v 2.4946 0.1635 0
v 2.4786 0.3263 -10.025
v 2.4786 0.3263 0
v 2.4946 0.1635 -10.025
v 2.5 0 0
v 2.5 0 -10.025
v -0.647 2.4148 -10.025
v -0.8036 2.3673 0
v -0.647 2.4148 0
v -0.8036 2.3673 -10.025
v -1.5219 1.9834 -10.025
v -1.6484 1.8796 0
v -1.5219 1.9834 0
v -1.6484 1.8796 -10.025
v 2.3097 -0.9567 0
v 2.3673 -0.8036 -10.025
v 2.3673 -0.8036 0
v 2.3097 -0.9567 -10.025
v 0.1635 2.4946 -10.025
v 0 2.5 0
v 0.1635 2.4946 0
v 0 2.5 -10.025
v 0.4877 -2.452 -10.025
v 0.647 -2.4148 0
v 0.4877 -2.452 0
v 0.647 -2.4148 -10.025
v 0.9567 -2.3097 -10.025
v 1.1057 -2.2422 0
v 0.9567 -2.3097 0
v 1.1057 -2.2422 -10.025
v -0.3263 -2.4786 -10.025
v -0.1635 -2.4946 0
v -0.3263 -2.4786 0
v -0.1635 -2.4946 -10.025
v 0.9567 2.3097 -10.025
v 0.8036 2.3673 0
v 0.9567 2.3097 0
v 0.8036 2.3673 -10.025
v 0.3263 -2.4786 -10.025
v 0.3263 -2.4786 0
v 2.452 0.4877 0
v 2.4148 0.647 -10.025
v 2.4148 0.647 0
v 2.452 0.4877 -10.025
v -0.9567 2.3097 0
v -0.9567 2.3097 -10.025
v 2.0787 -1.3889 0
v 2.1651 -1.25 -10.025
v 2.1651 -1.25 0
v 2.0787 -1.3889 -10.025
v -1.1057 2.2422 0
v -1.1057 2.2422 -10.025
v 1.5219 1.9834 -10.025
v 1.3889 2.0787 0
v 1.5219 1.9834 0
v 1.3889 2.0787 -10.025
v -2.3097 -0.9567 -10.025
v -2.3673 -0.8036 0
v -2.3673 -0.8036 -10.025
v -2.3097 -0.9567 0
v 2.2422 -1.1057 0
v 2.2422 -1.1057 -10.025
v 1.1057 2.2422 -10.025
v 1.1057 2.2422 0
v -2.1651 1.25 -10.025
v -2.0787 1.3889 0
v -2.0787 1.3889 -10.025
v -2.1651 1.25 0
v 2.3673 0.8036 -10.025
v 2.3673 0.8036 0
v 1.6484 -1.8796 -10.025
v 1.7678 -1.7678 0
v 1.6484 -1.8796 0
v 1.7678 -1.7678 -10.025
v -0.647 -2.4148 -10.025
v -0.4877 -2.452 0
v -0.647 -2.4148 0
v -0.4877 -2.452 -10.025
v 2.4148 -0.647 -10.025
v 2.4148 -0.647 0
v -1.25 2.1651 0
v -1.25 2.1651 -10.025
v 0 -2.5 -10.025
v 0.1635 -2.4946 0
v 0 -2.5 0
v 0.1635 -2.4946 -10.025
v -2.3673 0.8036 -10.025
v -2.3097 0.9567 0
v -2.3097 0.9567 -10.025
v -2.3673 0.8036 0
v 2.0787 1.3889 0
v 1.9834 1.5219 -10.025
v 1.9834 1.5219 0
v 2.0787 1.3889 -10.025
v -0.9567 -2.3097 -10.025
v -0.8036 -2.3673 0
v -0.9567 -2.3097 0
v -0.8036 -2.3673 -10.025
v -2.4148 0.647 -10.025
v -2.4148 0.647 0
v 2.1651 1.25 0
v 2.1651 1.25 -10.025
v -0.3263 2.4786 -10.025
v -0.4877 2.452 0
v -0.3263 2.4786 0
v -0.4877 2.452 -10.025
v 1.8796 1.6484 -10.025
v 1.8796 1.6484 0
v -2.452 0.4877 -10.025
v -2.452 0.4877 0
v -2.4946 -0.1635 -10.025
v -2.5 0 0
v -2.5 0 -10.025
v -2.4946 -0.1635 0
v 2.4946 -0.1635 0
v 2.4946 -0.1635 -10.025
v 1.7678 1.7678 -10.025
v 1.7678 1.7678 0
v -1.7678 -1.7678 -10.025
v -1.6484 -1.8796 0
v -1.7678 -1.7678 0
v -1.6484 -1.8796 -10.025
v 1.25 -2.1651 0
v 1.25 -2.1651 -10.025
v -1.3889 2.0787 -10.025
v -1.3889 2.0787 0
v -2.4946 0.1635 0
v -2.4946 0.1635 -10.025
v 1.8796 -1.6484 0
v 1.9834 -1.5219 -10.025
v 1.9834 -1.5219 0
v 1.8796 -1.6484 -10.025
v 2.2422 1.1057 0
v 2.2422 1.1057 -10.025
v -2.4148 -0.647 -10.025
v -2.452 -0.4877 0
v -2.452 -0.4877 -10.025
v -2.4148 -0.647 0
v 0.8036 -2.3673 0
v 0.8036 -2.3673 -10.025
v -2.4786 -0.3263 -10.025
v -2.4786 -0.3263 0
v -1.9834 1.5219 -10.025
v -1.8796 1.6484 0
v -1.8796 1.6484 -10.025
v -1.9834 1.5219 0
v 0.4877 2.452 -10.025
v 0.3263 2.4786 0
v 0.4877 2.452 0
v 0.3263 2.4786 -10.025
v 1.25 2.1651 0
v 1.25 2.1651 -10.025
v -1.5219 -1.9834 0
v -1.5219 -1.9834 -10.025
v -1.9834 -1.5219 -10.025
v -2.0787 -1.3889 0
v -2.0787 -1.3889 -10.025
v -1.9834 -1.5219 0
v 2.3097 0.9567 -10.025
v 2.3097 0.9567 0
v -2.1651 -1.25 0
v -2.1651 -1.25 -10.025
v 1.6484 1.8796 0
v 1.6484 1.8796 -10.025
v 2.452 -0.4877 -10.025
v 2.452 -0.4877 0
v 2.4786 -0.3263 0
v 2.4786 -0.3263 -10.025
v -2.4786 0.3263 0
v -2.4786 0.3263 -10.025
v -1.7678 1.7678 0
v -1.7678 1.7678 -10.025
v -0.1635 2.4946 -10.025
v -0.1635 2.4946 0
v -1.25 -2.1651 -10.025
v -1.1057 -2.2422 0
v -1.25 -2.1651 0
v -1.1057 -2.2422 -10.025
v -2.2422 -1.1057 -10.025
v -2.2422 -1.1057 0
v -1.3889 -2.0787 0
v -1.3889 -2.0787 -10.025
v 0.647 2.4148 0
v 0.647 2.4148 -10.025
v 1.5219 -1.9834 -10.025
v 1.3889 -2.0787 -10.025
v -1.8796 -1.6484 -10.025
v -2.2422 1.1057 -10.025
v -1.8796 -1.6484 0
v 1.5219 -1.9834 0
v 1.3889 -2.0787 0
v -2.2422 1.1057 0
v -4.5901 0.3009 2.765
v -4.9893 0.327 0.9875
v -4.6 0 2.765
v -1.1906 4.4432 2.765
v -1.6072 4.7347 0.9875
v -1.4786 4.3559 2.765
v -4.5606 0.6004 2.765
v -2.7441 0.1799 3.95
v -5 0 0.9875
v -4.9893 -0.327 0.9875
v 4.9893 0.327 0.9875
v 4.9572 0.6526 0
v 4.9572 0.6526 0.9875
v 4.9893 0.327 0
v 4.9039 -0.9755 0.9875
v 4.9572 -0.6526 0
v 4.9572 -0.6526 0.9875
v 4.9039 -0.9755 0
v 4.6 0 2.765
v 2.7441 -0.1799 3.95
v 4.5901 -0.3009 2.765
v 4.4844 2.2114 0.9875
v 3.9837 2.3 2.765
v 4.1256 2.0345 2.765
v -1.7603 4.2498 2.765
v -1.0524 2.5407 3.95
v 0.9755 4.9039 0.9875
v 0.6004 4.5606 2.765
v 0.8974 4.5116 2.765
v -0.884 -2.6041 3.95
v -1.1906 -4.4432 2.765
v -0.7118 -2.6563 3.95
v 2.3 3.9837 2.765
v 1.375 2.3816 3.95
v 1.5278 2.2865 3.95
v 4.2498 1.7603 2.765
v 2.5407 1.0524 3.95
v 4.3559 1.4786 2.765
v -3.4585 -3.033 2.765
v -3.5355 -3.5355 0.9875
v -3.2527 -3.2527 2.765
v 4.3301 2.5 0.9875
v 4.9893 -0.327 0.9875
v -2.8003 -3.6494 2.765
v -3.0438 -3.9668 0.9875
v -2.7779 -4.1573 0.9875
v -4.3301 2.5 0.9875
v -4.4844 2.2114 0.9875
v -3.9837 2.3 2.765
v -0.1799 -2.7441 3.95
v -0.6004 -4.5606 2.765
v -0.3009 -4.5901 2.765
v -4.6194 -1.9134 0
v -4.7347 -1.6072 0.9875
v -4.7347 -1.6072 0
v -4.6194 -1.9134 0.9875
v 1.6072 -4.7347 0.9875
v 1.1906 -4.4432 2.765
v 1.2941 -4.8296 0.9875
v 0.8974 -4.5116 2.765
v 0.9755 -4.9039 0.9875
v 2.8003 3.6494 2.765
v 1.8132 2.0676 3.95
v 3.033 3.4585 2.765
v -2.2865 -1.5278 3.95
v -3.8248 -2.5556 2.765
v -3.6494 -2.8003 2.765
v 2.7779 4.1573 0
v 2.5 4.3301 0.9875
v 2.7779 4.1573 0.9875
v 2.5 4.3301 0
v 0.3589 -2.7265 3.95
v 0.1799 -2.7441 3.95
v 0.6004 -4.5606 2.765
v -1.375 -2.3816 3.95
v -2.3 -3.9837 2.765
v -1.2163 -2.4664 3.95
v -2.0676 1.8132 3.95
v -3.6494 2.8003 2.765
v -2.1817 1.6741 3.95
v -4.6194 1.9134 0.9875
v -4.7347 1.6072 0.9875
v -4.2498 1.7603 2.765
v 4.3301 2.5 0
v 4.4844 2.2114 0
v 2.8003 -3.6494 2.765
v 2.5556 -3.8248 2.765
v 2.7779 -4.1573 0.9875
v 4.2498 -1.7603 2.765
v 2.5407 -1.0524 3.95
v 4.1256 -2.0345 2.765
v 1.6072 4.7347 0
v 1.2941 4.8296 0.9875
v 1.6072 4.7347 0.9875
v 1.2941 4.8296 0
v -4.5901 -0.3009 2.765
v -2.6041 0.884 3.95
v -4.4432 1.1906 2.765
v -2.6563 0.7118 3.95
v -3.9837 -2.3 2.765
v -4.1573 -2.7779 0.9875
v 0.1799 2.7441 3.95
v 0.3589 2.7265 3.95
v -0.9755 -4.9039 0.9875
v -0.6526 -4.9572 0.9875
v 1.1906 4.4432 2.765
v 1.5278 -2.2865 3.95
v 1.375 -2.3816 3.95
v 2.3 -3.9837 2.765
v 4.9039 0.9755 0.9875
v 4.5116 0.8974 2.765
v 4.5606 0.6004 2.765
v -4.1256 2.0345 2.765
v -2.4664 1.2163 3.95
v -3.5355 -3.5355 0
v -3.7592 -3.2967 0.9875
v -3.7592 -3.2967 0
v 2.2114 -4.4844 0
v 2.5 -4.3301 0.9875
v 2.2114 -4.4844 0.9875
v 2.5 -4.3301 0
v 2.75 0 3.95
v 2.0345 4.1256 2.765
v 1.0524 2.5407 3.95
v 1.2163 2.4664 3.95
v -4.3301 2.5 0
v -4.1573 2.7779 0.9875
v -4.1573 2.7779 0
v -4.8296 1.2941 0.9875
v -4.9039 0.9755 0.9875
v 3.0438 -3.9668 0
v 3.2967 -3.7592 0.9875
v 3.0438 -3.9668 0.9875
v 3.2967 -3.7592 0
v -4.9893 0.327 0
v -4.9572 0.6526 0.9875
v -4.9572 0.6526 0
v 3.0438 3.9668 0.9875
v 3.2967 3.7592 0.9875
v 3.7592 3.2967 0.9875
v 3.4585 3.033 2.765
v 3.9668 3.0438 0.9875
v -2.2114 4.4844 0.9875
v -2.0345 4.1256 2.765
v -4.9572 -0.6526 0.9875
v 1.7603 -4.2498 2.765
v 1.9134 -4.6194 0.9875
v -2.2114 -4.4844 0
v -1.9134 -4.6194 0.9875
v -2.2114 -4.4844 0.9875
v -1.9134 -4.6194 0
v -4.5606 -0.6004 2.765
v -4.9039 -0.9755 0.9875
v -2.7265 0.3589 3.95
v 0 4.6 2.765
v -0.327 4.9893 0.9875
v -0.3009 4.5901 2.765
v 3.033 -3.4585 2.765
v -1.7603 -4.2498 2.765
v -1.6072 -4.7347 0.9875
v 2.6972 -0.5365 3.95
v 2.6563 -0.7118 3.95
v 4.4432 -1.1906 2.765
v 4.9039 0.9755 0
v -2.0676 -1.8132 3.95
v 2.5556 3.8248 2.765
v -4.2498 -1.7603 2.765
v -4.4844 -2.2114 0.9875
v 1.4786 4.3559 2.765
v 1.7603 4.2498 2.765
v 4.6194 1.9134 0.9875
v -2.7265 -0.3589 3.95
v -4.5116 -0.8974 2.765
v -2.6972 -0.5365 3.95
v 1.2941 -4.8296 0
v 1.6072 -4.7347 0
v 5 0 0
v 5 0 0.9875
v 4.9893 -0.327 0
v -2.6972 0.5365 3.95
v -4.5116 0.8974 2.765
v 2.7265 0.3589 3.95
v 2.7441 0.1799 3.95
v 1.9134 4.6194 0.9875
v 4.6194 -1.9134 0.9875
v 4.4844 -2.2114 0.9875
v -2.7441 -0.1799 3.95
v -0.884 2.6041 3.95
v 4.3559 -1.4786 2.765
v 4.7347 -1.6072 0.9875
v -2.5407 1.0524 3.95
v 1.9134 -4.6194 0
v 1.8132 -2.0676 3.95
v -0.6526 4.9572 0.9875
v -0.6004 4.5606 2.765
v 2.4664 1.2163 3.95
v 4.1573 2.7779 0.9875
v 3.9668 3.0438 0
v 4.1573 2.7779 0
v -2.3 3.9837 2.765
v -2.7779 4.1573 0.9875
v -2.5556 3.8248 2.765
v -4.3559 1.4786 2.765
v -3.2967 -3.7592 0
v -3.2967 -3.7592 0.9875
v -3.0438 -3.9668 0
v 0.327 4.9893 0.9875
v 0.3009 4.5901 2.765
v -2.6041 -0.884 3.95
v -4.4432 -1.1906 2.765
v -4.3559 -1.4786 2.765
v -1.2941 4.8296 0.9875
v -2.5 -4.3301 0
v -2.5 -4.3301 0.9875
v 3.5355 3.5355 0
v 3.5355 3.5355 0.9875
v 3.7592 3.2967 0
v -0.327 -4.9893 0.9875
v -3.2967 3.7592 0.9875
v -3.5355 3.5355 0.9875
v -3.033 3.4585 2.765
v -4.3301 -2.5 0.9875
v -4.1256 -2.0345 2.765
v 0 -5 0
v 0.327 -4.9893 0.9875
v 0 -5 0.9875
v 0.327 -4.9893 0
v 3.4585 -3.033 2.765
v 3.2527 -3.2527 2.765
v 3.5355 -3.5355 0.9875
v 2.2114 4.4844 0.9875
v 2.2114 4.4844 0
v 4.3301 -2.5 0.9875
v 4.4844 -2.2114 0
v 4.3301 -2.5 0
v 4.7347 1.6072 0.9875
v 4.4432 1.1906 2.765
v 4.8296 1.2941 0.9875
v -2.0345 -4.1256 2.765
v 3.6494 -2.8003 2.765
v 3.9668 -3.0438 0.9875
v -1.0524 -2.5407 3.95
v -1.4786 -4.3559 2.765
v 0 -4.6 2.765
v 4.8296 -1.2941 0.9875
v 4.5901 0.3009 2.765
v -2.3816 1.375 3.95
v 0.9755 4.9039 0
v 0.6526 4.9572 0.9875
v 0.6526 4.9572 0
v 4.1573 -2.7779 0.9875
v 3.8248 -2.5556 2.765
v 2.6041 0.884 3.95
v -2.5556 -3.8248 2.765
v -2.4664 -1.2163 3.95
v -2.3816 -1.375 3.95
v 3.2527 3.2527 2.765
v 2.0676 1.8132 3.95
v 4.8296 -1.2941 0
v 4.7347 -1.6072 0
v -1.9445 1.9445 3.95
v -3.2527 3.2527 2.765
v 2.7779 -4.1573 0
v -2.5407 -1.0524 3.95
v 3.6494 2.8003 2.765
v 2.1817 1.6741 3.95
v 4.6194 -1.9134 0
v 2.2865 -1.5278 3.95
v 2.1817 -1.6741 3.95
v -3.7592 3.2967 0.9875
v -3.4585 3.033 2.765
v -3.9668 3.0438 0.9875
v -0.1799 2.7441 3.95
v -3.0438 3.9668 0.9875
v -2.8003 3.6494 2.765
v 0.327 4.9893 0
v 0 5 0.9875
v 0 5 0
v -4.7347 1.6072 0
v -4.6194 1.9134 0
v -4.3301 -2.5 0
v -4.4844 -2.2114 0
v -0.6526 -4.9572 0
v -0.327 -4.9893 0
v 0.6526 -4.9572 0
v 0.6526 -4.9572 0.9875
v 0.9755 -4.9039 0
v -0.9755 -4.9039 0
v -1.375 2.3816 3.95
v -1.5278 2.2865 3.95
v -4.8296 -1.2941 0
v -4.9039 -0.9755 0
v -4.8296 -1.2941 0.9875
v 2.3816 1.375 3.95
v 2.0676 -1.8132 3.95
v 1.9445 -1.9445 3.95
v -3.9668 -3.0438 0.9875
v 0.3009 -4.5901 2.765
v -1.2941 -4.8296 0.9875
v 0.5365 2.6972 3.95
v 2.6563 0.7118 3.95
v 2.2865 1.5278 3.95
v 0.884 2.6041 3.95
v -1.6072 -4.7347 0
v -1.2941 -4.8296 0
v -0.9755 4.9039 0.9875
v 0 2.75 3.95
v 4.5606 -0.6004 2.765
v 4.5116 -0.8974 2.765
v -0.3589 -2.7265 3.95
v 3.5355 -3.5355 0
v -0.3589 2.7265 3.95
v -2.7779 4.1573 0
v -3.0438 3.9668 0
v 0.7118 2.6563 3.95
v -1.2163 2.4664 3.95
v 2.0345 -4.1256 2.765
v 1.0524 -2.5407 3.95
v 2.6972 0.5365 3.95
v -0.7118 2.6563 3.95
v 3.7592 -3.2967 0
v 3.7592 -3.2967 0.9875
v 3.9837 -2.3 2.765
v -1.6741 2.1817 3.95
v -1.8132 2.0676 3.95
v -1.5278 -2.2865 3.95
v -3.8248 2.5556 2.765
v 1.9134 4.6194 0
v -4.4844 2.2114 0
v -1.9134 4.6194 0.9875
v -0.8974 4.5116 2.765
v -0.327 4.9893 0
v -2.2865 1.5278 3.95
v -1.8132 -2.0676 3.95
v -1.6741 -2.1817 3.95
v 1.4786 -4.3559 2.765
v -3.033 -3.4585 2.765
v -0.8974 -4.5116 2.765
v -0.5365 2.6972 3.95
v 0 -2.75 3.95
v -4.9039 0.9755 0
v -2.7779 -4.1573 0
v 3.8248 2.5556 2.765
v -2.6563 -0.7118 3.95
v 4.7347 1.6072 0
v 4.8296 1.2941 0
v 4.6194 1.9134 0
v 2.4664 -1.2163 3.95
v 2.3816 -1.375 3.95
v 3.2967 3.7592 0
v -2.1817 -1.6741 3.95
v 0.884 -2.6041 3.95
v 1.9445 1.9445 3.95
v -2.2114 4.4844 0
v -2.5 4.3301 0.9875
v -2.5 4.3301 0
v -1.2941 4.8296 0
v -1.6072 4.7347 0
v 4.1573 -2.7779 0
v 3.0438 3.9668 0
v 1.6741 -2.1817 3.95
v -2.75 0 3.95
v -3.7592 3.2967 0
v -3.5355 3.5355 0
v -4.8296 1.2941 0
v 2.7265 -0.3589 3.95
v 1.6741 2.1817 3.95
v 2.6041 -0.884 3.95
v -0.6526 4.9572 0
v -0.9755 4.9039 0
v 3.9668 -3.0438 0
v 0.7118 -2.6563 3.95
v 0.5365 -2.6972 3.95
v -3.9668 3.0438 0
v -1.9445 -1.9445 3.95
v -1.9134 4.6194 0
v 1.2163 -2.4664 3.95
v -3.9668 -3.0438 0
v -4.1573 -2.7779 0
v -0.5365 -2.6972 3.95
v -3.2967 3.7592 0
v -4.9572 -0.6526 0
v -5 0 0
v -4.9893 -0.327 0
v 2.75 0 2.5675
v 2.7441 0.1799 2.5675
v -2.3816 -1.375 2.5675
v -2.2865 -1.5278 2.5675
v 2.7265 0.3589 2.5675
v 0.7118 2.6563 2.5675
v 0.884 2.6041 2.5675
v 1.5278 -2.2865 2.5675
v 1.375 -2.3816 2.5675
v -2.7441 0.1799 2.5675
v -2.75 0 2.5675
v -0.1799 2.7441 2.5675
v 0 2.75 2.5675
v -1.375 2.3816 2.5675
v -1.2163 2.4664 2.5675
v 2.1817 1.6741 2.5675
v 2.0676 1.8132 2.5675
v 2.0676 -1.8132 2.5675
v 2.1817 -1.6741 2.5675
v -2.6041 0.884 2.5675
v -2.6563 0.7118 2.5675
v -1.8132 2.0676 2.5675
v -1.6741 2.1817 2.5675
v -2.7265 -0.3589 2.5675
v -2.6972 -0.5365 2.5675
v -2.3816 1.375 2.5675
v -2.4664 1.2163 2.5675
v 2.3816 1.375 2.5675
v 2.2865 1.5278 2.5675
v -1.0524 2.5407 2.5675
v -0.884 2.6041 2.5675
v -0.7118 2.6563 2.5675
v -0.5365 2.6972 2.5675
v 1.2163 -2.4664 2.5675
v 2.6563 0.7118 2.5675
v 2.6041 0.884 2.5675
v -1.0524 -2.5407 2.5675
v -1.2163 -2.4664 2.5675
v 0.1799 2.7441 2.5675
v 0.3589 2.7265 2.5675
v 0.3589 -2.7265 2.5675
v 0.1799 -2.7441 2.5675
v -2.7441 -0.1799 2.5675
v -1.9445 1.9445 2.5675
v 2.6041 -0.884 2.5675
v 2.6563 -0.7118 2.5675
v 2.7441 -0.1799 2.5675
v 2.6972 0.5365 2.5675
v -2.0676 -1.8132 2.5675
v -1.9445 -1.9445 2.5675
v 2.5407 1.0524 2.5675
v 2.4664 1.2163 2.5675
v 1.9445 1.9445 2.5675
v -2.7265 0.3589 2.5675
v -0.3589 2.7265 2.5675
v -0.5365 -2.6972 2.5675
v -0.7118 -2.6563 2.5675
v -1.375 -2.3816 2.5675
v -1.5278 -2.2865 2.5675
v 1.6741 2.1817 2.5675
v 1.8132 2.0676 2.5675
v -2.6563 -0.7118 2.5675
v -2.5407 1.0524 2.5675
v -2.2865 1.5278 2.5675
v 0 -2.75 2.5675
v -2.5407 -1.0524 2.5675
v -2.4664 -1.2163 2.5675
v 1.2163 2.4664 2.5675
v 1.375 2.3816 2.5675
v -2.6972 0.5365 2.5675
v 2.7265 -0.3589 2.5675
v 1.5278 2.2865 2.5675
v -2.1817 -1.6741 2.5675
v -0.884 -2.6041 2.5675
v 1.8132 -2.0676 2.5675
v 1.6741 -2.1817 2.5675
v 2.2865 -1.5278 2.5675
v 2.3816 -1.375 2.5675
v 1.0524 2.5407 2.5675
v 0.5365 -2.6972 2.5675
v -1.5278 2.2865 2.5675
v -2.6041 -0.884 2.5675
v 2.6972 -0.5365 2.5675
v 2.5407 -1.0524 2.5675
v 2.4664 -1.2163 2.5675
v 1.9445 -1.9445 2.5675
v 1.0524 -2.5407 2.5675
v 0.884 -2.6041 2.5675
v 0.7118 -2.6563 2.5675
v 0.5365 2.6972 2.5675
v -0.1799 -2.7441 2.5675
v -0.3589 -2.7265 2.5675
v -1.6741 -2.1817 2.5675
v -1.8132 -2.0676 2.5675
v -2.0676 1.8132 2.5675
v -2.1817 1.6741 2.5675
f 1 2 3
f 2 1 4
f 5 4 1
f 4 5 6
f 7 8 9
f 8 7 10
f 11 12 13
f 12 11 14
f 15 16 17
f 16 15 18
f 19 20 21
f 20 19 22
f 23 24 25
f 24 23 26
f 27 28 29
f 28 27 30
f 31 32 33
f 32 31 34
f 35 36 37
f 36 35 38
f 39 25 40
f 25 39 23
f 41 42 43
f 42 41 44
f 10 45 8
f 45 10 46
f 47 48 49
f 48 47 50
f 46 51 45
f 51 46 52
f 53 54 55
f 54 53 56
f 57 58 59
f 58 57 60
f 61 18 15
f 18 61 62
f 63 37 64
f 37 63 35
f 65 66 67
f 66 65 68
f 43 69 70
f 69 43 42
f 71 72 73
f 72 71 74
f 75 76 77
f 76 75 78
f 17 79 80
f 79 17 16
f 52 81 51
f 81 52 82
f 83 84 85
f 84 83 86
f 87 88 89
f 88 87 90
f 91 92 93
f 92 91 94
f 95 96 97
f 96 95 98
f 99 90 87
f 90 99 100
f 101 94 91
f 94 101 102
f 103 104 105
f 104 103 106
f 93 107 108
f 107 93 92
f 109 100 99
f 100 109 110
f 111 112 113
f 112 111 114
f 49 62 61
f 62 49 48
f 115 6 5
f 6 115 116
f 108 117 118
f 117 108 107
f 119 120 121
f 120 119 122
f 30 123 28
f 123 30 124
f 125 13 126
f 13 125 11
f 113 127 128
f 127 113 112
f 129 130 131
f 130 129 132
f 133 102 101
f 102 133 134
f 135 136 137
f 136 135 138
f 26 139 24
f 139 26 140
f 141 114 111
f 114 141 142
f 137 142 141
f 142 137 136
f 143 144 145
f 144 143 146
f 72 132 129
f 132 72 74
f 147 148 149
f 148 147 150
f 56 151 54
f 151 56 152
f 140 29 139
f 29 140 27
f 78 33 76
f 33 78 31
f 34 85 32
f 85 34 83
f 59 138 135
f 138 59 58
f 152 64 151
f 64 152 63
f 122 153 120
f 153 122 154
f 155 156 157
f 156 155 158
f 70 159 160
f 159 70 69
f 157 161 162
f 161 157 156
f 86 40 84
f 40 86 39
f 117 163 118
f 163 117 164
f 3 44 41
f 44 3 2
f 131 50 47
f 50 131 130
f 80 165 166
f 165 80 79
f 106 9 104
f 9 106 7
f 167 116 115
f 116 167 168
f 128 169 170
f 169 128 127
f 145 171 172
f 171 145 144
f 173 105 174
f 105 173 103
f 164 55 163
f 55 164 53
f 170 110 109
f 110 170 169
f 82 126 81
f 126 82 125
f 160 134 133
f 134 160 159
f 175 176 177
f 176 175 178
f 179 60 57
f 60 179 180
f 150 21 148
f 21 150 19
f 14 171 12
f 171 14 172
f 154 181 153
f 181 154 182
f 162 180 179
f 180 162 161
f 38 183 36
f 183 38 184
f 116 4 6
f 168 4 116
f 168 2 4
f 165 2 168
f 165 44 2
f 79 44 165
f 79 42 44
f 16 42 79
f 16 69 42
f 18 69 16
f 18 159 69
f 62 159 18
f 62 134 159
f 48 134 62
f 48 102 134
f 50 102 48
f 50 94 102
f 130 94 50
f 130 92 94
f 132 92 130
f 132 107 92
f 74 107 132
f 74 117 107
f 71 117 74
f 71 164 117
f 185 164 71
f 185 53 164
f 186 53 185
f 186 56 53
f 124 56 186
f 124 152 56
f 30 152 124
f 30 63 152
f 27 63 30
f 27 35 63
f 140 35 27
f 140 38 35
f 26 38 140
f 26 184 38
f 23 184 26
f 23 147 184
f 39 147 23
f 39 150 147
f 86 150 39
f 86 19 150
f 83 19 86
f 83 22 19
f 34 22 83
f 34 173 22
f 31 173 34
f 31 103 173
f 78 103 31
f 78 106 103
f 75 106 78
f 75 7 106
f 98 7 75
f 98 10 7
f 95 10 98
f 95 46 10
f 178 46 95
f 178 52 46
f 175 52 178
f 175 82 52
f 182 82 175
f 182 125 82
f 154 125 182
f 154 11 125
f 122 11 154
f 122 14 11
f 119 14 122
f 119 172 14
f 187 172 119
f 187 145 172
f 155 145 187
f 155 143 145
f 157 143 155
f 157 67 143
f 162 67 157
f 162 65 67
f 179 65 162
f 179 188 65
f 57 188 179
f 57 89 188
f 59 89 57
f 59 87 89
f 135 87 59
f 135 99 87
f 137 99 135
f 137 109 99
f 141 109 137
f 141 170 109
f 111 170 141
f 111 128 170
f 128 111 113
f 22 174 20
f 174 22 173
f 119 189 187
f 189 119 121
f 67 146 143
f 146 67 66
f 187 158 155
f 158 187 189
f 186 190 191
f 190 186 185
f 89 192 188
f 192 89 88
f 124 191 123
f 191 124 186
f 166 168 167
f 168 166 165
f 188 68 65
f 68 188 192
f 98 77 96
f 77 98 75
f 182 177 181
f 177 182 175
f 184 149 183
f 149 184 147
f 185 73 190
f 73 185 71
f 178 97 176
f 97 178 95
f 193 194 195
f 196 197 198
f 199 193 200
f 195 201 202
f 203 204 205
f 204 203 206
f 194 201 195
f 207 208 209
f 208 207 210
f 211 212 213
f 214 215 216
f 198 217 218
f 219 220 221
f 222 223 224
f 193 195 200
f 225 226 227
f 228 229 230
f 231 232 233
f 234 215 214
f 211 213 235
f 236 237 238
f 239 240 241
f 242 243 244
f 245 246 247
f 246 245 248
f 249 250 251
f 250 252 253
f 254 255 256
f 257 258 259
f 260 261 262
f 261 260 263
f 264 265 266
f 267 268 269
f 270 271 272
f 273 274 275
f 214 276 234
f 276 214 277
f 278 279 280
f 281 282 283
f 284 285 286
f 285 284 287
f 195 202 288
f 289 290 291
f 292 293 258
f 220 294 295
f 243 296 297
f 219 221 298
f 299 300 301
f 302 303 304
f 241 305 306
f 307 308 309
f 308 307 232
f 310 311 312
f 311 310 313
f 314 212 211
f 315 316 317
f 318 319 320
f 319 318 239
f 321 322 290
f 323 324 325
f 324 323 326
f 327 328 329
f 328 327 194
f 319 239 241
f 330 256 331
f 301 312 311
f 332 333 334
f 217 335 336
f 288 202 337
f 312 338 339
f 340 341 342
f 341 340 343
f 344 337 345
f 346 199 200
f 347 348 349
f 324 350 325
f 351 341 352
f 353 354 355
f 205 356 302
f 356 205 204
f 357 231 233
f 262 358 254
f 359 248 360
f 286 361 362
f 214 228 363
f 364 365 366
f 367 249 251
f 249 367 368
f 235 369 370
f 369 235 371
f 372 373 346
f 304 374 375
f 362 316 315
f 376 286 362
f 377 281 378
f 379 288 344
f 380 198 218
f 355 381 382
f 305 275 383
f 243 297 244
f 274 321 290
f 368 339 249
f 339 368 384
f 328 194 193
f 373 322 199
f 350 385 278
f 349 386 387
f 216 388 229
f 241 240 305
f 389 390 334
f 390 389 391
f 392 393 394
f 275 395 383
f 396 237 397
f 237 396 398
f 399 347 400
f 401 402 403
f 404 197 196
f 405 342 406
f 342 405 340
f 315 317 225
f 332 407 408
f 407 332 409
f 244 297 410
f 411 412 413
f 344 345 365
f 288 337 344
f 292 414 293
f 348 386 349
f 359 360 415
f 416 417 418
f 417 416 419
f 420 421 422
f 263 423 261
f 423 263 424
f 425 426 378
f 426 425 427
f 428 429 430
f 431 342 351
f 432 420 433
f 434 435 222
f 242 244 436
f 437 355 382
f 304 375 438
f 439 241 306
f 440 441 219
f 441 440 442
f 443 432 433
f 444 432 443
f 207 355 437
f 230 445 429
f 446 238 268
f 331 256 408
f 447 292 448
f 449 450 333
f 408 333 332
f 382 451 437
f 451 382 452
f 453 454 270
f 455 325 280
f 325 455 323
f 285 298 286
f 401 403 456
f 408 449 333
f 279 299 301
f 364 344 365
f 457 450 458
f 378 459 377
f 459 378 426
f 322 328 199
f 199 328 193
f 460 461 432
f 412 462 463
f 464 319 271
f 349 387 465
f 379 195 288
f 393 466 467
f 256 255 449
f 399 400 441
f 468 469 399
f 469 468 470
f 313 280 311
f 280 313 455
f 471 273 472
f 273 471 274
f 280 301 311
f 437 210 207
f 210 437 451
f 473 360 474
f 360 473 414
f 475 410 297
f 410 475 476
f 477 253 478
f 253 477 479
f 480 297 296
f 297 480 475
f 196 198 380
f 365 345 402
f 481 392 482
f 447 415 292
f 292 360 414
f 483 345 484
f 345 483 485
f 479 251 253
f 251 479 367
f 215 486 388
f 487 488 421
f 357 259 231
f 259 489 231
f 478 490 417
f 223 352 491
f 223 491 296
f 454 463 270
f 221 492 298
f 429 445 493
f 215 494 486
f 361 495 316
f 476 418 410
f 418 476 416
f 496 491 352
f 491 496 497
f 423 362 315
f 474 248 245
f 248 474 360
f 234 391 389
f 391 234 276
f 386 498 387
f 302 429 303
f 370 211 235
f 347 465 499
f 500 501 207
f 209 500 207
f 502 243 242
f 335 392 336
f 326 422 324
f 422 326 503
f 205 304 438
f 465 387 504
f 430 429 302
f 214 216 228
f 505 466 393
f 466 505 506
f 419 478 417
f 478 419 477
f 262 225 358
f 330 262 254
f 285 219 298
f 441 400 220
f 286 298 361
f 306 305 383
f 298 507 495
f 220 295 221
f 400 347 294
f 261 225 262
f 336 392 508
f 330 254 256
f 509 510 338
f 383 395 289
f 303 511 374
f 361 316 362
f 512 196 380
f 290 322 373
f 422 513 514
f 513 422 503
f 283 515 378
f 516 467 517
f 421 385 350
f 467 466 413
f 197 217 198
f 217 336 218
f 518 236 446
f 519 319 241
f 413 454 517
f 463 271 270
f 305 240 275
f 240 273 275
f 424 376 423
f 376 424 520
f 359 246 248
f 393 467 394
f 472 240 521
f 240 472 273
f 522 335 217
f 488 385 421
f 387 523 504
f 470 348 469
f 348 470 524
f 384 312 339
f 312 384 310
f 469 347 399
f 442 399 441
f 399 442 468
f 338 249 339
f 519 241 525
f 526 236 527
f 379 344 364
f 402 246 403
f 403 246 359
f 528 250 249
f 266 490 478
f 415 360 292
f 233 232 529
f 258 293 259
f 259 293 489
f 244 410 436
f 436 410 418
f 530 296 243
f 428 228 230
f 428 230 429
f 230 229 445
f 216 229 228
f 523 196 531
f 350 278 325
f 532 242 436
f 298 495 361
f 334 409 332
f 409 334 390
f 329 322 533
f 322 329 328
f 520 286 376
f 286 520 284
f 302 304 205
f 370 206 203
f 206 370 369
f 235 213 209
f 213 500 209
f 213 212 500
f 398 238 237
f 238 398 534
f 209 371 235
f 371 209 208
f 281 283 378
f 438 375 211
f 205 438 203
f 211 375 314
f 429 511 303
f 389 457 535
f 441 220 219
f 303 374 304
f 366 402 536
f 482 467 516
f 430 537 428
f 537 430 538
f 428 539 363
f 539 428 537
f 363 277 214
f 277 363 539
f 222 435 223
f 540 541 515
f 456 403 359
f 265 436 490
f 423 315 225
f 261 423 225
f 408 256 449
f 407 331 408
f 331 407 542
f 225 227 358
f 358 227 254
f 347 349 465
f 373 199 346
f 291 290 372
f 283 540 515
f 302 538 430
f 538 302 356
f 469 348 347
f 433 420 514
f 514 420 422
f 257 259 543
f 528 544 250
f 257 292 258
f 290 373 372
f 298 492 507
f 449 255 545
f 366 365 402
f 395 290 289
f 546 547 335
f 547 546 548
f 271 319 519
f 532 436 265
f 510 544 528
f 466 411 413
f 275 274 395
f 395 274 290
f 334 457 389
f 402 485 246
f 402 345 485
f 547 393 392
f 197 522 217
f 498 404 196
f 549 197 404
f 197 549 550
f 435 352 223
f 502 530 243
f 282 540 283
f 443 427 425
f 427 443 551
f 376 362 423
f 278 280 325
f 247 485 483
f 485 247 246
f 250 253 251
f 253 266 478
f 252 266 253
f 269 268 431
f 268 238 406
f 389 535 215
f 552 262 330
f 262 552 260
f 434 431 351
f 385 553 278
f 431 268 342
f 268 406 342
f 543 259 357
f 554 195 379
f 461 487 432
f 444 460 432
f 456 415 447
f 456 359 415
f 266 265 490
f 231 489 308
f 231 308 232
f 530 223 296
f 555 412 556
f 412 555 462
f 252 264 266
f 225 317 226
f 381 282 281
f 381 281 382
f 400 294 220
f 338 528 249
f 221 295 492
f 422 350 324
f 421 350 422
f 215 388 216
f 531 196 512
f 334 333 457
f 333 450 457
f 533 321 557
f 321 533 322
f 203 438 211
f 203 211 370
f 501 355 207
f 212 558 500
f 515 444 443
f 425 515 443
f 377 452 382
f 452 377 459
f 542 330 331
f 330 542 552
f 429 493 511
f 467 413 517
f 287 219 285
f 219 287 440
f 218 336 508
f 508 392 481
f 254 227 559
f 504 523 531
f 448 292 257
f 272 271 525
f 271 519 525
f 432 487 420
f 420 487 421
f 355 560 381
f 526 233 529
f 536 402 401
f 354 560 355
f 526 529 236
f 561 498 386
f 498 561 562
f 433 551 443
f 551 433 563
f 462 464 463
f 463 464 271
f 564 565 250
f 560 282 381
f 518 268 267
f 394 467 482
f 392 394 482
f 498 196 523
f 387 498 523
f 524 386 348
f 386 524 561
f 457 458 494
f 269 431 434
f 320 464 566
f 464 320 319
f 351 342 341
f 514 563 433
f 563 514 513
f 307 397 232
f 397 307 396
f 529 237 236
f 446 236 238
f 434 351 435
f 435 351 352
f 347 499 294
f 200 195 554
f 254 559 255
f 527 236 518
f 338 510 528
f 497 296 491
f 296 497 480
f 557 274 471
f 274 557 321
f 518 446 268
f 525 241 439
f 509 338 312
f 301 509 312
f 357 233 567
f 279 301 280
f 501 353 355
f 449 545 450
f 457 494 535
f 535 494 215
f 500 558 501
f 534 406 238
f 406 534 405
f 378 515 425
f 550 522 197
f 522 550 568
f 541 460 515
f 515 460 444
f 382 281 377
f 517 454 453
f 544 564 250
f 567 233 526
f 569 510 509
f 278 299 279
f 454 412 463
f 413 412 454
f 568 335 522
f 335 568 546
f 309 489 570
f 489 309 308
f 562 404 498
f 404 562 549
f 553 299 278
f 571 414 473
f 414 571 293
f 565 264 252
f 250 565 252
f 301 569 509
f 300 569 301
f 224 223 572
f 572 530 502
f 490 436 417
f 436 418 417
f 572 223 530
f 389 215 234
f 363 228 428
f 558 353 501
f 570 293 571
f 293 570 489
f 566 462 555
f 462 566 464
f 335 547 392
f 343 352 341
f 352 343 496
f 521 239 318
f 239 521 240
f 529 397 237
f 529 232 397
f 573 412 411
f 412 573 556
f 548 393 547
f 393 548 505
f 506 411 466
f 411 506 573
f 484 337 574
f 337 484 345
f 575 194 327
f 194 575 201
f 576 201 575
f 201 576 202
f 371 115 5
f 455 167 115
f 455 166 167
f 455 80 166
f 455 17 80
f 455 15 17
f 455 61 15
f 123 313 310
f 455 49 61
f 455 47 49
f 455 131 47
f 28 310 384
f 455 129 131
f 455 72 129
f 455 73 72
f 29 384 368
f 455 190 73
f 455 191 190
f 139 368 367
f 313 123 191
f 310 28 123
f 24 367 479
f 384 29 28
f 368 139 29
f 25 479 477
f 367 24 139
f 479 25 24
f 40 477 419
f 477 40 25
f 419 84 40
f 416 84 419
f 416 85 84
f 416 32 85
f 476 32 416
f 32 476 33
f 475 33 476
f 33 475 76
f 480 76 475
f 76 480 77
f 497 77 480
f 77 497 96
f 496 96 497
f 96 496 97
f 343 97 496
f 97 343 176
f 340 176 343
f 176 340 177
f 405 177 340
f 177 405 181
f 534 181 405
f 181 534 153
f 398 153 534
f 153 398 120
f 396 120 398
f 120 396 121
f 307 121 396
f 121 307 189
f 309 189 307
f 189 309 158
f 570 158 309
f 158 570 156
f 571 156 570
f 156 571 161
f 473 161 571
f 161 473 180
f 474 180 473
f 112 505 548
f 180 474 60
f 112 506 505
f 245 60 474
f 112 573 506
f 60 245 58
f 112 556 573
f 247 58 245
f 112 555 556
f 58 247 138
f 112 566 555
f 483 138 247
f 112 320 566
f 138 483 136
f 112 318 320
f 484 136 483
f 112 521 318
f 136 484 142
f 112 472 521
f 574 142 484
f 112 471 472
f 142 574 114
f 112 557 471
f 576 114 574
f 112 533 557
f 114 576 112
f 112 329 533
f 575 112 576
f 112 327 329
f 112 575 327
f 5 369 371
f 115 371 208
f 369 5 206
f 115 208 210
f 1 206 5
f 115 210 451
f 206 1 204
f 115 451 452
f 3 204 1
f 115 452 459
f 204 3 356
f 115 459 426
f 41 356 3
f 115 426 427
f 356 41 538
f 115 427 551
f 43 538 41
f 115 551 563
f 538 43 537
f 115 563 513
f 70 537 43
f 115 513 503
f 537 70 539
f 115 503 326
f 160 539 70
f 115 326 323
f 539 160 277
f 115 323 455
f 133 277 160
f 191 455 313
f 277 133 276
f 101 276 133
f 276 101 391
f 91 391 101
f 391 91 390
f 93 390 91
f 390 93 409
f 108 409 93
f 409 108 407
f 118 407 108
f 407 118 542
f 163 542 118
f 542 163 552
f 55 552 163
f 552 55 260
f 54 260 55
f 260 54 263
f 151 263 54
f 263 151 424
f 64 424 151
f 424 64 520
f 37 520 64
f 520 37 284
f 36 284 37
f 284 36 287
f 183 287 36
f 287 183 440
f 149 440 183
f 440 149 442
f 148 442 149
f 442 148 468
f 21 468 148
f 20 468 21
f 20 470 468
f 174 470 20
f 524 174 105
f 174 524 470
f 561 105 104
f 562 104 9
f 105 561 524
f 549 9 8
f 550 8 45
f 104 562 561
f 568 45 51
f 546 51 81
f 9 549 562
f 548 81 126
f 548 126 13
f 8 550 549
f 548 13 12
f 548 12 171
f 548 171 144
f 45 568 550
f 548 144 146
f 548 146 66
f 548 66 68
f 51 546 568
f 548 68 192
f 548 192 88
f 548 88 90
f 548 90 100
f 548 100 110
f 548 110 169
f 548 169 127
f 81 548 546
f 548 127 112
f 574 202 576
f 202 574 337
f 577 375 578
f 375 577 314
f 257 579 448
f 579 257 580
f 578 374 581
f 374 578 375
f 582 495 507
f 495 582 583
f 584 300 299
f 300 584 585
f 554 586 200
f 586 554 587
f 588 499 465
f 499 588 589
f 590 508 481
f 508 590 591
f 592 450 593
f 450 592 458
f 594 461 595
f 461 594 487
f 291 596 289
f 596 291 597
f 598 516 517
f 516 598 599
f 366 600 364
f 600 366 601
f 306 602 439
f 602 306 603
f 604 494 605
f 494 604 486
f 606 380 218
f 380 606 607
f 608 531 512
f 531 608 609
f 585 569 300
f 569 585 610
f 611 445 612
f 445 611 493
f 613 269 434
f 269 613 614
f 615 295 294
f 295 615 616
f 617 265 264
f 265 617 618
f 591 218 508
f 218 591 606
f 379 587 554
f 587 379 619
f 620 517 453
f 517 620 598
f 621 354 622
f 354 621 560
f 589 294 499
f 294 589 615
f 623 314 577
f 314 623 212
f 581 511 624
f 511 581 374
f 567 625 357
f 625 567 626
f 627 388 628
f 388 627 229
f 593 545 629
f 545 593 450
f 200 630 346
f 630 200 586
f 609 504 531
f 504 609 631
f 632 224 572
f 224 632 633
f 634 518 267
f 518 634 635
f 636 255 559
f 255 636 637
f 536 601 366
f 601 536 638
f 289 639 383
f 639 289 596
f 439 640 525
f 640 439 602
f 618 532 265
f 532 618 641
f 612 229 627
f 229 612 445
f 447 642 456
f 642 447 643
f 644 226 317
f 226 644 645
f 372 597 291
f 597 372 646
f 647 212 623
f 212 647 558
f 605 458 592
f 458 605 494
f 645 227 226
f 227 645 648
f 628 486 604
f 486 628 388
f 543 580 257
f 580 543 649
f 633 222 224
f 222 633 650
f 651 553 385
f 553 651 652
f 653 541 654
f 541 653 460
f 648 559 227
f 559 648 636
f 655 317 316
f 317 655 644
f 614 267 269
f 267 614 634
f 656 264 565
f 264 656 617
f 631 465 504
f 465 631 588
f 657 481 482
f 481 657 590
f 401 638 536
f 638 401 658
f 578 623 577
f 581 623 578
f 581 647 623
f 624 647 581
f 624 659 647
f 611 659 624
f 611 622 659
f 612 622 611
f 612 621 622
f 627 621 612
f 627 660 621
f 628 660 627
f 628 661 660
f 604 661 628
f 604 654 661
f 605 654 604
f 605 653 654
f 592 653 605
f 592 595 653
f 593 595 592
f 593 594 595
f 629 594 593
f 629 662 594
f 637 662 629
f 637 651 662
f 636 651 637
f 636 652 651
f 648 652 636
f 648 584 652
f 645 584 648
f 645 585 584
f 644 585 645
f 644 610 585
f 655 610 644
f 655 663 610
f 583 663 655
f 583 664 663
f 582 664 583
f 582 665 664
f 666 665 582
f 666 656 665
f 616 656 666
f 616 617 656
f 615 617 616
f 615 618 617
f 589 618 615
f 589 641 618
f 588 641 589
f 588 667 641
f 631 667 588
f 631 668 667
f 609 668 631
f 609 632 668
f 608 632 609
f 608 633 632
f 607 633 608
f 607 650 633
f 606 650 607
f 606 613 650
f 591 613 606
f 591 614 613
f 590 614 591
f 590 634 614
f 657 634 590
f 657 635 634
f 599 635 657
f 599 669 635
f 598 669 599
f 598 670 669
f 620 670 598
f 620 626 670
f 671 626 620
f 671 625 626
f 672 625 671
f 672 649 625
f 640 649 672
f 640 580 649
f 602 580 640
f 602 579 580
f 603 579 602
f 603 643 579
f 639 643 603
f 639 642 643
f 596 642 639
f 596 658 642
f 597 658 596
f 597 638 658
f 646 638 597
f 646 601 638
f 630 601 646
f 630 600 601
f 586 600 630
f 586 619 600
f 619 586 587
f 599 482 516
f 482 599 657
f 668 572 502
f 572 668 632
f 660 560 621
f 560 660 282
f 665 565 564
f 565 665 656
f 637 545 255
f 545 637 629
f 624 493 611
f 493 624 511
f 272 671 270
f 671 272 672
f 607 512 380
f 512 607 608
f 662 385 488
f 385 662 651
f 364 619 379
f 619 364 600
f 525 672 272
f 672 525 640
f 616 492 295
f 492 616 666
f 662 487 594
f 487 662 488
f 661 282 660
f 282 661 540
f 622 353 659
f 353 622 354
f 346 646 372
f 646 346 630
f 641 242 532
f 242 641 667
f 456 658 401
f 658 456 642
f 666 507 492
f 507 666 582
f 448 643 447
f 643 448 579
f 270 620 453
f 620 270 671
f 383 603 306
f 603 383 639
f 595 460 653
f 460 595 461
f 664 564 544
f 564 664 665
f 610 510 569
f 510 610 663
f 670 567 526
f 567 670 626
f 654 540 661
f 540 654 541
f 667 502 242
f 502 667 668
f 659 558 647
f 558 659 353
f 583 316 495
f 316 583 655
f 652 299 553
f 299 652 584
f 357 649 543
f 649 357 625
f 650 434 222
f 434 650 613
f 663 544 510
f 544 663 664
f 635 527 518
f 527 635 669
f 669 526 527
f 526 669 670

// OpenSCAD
// Pan head screw (single connected solid)
// Requested: 5.0mm shank diameter, 10.0mm head diameter, 3.95mm head height, 10.0mm length under head

$fn = 96;

// Parameters (mm)
shaft_diameter_mm      = 5.0;
length_under_head_mm   = 10.0;
head_diameter_mm       = 10.0;
head_height_mm         = 3.95;

// Simple pan-head profile controls
head_top_flat_factor   = 0.55;   // fraction of head radius that is flat on top
head_crown_height_frac = 0.70;   // where the crown starts (as fraction of head height)

// Small overlap to ensure watertight union
overlap_mm = 0.05;

// Optional shallow drive recess (kept subtle; still one solid via difference)
drive_recess_diameter_factor = 0.55; // fraction of head diameter
drive_recess_depth_factor    = 0.35; // fraction of head height

module pan_head_screw() {
    shank_r = shaft_diameter_mm/2;
    head_r  = head_diameter_mm/2;

    // Place underside of head at z=0, shank extends to negative z
    difference() {
        union() {
            // Shank (length under head)
            translate([0,0,-length_under_head_mm/2])
                cylinder(h=length_under_head_mm + overlap_mm, r=shank_r, center=true);

            // Pan head (underside at z=0, top at z=head_height_mm)
            // Built as a revolve of a 2D profile in the X-Z plane.
            rotate_extrude(convexity=10)
                polygon(points=[
                    // Start at axis on underside
                    [0, 0],
                    // Underside outer edge
                    [head_r, 0],
                    // Vertical-ish side up a bit
                    [head_r, head_height_mm*0.25],
                    // Crown transition
                    [head_r*0.92, head_height_mm*head_crown_height_frac],
                    // Top flat outer edge
                    [head_r*head_top_flat_factor, head_height_mm],
                    // Back to axis at top
                    [0, head_height_mm]
                ]);
        }

        // Shallow drive recess (subtracted), centered on head top
        recess_r = (head_diameter_mm * drive_recess_diameter_factor)/2;
        recess_h = head_height_mm * drive_recess_depth_factor;

        translate([0,0, head_height_mm - recess_h/2 + overlap_mm])
            cylinder(h=recess_h + 2*overlap_mm, r=recess_r, center=true);
    }
}

pan_head_screw();
